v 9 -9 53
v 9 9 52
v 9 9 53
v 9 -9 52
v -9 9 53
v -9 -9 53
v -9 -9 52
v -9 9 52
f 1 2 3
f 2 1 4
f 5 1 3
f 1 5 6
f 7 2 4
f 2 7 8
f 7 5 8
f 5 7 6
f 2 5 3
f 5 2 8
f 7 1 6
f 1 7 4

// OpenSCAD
// A thin slab through the roof cap. Solid cap ⇒ a plain box (12 triangles);
// any hole through the cap adds facets.
include <../../src/lantern.scad>
part = "none";
intersection() {
  roof();
  translate([0, 0, fascia_h + roof_rise + 1]) sq(cap_w - 2, 1);
}
